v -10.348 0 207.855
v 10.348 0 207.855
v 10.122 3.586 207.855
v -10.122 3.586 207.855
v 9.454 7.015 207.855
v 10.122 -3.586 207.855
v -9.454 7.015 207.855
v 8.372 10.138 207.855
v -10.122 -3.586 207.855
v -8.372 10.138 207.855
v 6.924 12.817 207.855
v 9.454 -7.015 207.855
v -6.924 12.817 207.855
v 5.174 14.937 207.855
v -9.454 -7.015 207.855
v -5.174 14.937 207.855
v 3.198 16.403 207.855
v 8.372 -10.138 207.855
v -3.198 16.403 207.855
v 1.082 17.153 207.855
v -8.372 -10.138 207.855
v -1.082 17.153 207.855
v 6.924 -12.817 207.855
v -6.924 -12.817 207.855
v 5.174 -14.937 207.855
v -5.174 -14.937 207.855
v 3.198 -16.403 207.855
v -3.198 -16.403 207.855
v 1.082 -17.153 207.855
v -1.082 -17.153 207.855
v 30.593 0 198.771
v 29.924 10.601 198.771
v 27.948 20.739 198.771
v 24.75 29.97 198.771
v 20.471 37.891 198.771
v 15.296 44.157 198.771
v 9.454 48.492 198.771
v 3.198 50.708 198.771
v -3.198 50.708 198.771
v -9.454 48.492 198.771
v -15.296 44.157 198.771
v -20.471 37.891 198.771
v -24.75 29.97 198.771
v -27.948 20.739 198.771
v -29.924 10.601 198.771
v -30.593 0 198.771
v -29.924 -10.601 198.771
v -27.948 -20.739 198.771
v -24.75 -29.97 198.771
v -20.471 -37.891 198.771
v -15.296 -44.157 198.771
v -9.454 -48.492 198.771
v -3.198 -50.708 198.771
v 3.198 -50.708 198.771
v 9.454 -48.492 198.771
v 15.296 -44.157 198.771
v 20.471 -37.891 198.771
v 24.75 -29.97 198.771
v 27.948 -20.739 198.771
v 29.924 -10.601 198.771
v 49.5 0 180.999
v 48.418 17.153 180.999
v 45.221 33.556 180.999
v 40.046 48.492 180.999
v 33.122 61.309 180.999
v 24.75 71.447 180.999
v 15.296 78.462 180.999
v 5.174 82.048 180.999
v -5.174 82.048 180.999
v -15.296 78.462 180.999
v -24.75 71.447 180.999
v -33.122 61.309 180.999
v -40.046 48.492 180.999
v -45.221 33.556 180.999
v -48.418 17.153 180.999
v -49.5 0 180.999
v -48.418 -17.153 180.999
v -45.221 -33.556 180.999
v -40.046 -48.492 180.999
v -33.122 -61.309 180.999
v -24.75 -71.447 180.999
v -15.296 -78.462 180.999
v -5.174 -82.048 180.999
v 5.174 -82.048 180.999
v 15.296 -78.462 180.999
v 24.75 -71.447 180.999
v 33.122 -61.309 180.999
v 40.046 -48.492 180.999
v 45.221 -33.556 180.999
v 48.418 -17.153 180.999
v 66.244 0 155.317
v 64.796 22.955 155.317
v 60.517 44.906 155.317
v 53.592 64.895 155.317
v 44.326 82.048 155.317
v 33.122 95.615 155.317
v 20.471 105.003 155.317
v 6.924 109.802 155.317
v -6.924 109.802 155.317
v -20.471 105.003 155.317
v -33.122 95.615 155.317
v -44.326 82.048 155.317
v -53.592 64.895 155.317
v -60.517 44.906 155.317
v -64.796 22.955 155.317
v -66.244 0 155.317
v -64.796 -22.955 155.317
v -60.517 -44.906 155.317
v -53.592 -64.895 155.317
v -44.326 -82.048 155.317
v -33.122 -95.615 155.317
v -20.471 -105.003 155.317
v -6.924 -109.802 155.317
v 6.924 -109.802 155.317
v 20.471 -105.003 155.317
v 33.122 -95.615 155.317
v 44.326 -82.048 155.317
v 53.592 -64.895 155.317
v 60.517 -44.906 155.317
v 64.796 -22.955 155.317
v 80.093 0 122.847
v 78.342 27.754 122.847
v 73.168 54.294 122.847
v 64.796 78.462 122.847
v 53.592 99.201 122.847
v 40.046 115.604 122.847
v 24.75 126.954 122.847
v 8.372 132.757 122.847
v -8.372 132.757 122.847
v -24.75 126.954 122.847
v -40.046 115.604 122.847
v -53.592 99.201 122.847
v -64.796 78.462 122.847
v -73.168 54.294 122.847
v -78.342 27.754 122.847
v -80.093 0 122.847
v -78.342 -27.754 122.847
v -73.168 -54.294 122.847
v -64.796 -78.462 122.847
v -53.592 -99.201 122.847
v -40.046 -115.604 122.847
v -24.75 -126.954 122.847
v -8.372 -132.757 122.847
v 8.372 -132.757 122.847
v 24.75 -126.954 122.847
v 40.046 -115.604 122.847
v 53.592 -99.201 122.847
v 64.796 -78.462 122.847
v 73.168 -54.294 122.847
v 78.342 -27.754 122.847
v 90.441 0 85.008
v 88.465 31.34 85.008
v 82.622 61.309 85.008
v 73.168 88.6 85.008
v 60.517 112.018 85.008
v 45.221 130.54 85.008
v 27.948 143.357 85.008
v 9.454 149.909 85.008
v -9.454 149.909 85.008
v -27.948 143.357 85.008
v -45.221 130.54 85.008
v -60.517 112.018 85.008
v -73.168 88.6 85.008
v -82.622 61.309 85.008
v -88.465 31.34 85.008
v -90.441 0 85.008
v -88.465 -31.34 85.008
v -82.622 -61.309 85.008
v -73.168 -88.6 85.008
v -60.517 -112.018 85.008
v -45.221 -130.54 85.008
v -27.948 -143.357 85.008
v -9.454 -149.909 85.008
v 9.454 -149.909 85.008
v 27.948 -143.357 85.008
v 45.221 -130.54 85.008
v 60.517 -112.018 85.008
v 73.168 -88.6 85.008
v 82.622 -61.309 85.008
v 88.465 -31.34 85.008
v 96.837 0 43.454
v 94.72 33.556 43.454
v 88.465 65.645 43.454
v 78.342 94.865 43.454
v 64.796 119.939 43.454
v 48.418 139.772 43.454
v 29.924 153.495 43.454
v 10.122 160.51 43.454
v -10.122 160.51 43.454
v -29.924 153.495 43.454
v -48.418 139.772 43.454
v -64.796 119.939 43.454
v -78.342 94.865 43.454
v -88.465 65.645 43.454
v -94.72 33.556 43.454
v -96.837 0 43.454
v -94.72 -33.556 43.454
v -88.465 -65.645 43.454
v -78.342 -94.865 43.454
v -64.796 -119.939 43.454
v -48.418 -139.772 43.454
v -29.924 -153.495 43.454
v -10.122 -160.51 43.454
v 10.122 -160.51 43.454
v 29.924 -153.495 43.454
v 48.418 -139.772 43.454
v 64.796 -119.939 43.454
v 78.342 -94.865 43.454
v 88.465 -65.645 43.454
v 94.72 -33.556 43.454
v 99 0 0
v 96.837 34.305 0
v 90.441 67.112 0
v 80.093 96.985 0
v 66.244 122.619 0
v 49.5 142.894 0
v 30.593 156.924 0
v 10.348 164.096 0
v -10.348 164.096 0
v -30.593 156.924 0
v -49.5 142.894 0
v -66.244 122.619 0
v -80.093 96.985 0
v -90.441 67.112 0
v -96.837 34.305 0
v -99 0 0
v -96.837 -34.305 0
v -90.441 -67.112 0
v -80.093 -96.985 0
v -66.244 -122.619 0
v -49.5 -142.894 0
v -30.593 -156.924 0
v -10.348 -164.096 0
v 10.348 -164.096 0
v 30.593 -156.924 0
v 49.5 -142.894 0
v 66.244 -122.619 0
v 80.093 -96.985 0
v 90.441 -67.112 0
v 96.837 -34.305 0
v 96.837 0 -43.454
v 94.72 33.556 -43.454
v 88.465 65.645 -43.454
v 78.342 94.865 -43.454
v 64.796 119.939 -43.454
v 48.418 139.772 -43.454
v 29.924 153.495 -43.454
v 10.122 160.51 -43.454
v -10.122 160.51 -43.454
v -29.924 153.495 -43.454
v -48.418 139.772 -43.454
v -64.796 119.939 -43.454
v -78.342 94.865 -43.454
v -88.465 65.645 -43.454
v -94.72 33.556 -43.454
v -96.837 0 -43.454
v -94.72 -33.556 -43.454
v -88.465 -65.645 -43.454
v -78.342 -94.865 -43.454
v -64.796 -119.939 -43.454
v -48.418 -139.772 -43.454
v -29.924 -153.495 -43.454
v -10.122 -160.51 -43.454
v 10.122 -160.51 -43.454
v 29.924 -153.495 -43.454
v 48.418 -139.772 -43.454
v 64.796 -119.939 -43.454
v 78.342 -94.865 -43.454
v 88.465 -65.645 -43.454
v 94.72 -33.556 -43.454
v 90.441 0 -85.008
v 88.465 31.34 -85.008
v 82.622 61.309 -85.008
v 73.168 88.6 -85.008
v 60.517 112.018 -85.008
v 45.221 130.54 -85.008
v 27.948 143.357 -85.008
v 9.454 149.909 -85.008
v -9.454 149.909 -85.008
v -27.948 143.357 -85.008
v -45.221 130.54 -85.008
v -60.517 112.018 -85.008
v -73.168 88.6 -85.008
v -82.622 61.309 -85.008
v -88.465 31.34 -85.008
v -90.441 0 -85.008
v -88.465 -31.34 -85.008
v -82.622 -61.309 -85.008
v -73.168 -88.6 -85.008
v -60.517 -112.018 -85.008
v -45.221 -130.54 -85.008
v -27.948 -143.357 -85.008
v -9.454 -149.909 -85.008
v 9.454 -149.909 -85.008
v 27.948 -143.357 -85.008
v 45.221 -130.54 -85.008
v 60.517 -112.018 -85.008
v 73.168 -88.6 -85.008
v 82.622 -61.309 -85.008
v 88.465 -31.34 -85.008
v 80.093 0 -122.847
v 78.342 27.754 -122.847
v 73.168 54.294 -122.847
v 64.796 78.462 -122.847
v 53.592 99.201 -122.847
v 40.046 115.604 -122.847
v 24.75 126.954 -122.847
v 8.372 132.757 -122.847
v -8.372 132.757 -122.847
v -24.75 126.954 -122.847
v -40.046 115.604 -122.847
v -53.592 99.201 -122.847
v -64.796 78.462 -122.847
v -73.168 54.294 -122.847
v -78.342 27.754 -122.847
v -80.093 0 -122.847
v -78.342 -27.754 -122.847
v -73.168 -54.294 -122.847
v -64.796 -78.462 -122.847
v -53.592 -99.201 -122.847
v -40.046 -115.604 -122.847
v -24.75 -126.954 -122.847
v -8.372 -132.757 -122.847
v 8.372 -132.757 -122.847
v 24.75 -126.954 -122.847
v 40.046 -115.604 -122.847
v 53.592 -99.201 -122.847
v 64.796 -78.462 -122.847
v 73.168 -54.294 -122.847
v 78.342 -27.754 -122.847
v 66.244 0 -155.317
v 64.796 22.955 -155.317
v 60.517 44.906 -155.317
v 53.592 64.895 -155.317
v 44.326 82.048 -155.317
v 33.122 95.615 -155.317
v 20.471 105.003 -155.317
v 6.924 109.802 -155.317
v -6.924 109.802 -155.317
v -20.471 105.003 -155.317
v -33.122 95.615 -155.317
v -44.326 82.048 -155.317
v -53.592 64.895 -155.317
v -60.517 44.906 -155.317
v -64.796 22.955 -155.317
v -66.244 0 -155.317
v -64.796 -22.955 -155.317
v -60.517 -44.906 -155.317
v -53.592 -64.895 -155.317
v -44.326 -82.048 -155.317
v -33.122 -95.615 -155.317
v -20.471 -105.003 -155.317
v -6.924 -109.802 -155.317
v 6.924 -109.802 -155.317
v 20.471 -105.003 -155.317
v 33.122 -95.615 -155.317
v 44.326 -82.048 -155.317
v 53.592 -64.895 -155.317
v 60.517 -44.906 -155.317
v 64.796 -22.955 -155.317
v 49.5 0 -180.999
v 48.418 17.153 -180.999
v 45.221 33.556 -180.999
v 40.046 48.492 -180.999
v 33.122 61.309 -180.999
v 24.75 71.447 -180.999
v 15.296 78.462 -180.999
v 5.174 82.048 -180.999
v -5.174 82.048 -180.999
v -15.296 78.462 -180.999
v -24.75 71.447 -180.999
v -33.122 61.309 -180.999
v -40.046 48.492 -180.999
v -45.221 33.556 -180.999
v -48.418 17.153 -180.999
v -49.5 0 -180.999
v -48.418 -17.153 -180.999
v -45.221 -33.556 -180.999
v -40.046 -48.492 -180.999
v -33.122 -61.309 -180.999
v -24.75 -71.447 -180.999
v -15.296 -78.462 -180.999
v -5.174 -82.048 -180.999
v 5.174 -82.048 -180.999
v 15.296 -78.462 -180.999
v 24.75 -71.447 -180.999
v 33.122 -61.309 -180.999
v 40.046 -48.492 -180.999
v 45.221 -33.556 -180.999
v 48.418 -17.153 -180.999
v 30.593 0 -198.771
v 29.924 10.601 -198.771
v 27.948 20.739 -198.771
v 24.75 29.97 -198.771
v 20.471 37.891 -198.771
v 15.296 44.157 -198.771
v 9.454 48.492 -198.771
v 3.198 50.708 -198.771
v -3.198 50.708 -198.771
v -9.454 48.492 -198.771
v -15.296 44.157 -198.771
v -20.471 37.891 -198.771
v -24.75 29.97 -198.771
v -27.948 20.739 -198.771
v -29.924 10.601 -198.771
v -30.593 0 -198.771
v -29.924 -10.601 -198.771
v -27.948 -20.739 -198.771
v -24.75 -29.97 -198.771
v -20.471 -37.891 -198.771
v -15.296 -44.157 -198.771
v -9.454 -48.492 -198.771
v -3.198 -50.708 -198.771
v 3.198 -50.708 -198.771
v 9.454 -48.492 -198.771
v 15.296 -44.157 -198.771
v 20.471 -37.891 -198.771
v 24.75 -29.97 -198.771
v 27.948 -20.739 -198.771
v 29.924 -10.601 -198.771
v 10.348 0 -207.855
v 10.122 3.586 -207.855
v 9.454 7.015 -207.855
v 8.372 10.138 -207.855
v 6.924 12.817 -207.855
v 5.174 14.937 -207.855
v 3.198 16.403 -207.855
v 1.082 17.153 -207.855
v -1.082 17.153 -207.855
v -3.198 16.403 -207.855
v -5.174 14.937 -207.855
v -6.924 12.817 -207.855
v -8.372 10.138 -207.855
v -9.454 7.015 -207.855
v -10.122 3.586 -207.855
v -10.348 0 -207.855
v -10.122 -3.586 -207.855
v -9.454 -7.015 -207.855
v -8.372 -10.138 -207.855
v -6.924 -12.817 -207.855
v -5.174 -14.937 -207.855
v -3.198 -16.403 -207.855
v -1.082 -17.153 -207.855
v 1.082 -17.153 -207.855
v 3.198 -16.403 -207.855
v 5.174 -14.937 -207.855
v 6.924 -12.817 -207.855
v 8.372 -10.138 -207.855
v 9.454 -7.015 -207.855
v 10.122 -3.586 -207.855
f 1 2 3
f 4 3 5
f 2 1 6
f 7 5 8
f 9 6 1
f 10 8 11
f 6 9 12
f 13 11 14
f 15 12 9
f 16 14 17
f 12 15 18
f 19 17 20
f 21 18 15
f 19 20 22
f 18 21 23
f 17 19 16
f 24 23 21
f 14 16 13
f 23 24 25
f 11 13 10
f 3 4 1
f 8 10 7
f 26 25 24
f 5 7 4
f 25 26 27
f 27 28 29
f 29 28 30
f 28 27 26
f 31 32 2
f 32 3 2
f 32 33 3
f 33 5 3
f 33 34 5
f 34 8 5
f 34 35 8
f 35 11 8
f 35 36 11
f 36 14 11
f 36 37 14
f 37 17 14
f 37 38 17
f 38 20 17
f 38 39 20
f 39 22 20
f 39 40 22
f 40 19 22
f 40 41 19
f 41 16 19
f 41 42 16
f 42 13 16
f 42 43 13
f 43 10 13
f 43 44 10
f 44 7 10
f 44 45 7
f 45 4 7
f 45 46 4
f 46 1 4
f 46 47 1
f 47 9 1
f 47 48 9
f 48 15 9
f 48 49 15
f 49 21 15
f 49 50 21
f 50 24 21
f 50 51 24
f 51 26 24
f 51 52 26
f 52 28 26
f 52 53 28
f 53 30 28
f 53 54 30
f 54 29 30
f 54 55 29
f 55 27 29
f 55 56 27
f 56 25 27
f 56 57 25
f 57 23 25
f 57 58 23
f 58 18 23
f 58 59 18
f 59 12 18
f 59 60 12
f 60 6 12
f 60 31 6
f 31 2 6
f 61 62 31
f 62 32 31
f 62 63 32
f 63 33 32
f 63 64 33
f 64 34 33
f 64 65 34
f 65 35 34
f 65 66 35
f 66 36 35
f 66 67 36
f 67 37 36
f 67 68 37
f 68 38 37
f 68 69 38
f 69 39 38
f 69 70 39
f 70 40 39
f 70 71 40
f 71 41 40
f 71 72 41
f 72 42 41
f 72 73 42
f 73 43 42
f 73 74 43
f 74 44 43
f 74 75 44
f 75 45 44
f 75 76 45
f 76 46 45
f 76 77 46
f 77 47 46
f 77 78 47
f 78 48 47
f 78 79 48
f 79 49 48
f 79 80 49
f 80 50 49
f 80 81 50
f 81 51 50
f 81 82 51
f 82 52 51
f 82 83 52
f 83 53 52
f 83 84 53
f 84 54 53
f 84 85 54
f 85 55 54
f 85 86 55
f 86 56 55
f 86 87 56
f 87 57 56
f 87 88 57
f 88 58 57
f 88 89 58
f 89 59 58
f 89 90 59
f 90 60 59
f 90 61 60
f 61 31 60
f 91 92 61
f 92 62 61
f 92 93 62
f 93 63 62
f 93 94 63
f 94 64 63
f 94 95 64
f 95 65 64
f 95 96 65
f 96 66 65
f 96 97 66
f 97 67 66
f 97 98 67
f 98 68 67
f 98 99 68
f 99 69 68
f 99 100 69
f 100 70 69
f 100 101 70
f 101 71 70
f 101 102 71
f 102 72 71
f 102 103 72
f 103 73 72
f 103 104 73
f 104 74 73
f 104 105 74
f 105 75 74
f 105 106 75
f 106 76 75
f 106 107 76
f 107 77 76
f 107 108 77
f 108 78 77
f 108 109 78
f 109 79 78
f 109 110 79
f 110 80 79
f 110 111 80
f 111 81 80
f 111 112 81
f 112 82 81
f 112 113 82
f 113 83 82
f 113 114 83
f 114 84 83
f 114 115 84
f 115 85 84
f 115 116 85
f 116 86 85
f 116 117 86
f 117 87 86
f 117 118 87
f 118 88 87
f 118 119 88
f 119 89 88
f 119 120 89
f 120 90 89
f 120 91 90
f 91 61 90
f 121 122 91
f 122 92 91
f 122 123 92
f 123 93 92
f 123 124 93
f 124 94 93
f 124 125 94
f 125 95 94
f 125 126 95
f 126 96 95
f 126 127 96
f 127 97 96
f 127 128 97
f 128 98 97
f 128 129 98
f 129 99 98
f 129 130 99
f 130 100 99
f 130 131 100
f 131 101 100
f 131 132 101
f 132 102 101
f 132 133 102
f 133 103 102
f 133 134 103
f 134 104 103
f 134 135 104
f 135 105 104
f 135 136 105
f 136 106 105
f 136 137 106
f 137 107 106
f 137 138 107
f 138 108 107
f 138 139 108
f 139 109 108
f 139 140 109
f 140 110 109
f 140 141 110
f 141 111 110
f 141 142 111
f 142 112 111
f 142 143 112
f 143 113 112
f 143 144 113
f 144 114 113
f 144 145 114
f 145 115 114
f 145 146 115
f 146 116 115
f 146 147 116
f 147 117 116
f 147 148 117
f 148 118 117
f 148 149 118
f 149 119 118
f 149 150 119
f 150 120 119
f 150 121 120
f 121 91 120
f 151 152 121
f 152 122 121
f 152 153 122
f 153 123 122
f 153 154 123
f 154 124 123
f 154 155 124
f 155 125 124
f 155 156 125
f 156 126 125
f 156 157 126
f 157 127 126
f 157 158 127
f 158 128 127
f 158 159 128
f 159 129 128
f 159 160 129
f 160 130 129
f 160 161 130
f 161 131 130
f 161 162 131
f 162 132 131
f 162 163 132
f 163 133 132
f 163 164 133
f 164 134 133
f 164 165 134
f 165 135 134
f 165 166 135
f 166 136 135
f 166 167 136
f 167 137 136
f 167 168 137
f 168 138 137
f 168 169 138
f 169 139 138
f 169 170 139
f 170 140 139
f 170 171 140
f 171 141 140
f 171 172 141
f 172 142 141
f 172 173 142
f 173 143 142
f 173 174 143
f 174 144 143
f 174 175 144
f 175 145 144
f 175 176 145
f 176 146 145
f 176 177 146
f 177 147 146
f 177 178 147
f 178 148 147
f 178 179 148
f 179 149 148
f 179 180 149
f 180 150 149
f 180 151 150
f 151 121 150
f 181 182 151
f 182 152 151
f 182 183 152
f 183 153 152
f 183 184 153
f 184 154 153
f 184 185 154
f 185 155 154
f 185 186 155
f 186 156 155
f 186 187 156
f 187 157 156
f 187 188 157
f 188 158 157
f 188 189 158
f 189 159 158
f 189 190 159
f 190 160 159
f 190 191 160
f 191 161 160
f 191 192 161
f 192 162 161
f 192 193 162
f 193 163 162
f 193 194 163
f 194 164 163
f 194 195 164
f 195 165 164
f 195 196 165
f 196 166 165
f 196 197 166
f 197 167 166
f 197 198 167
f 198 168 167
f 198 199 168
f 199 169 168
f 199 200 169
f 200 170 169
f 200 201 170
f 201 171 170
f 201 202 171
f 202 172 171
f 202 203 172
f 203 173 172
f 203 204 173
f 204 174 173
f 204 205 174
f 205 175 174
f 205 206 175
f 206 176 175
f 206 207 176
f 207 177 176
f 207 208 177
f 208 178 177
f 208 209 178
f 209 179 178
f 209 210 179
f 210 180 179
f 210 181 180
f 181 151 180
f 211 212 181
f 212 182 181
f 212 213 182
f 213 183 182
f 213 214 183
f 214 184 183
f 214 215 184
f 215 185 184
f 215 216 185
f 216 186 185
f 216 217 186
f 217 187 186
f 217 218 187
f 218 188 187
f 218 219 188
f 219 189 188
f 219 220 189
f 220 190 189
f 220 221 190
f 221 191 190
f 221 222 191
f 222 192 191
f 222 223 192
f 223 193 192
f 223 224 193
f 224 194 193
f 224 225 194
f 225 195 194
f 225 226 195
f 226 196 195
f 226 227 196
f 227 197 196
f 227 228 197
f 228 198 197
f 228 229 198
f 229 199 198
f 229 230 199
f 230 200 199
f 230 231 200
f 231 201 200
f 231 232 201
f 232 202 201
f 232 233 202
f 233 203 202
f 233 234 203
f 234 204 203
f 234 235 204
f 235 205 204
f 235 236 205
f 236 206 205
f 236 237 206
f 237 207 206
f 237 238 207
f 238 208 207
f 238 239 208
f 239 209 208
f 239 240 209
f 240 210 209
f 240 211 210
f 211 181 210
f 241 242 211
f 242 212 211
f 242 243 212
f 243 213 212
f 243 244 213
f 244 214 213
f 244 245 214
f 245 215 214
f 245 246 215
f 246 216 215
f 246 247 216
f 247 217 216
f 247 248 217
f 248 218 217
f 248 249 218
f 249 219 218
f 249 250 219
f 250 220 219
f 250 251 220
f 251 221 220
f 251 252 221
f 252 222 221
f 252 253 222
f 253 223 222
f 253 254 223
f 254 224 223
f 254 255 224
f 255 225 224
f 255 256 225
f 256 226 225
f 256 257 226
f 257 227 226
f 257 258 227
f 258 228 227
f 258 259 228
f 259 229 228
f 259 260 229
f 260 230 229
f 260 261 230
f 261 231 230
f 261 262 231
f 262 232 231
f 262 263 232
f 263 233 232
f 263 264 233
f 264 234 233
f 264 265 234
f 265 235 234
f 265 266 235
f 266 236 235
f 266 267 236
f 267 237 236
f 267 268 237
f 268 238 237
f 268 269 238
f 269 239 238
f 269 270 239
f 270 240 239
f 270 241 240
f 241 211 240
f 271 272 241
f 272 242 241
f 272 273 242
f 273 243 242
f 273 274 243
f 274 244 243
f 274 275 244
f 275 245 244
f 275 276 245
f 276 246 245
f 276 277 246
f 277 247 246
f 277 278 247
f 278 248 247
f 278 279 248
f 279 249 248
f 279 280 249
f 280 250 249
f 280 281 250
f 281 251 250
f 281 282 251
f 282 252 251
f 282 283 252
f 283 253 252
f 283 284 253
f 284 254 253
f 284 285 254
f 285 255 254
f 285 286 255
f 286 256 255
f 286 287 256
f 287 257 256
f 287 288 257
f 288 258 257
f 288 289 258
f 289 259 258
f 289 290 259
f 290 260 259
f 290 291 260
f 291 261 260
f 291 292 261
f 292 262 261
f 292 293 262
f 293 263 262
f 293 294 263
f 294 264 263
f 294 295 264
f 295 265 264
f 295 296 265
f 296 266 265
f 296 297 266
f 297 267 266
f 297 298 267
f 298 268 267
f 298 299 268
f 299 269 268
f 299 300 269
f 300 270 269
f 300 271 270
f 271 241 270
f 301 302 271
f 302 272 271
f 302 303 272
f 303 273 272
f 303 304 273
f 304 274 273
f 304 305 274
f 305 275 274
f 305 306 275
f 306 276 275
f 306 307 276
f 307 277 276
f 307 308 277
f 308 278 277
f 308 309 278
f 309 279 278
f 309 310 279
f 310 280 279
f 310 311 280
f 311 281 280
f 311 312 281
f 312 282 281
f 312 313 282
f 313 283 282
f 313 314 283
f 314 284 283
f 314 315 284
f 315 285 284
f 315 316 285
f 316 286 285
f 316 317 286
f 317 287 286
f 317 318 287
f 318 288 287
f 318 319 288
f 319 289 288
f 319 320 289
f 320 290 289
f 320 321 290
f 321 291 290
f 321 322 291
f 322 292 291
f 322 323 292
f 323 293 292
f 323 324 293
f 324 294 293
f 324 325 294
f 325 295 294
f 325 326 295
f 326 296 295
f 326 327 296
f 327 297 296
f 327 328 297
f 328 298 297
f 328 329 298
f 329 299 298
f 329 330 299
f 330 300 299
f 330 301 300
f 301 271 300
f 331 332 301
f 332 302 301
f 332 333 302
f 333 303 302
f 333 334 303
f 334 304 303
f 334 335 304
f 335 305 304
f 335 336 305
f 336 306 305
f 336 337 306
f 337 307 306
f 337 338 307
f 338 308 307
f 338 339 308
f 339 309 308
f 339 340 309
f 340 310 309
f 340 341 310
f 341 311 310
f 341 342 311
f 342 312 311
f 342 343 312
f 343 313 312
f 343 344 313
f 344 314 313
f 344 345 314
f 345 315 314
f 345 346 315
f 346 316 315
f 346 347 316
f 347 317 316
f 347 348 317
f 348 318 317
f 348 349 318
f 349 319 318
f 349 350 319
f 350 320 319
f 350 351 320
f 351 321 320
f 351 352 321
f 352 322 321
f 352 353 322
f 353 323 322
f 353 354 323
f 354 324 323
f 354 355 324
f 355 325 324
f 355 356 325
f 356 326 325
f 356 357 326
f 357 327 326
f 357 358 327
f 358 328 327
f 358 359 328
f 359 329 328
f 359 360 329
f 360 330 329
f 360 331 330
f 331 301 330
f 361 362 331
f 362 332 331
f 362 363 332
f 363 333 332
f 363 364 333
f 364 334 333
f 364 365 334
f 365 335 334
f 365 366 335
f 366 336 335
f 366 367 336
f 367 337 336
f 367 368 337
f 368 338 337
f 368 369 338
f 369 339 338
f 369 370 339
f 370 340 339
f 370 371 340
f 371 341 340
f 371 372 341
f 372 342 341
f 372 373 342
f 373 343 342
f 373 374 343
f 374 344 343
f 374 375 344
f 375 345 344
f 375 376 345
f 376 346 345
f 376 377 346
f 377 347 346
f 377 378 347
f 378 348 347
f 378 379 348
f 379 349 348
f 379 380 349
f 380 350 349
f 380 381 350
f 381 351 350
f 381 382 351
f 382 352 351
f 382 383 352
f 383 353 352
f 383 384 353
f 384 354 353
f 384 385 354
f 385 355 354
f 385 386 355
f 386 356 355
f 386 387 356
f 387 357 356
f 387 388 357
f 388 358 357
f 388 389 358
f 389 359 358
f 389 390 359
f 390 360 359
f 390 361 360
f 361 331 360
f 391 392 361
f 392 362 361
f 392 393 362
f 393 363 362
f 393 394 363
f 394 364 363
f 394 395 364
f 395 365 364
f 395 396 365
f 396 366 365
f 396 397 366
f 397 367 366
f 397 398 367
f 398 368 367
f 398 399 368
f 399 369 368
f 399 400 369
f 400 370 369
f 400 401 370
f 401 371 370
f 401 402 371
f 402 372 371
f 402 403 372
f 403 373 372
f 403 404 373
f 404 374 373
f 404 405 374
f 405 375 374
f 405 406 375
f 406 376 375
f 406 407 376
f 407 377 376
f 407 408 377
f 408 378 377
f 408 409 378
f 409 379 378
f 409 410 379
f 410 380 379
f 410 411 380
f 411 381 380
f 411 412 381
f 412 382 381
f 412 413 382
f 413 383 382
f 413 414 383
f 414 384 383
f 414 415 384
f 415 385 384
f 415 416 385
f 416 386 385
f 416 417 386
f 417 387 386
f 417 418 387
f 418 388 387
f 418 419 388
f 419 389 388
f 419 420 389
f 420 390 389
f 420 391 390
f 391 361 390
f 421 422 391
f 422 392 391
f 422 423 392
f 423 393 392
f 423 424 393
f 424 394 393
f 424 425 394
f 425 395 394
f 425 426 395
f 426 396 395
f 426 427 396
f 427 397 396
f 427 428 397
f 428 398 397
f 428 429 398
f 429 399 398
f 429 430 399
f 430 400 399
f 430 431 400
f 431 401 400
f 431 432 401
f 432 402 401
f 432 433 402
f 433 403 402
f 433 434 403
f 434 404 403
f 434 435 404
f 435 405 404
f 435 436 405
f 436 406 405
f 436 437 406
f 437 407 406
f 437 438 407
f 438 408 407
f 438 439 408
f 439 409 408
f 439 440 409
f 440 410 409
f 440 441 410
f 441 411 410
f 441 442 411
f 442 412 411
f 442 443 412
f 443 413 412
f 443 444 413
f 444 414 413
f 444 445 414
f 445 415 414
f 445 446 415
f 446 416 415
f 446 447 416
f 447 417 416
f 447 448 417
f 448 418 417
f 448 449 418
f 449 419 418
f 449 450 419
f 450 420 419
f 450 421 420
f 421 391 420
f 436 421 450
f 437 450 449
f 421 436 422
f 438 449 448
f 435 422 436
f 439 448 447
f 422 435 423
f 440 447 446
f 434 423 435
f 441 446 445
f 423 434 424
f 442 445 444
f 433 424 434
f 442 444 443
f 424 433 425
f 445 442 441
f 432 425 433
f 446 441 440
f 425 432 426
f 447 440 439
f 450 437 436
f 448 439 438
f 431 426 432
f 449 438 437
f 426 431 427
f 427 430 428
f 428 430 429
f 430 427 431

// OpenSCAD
// Generated by SolidPython 1.0.1 on 2020-07-29 00:46:49


scale(v = [9, 15, 19]) {
	sphere(r = 11);
}
/***********************************************
*********      SolidPython code:      **********
************************************************
 
# import packages: SolidPython
from solid import *
from solid.utils import *
from itertools import chain, combinations, permutations


class Resize:

    def __init__(self, scad_file):
        self.scad_file = scad_file
        #self.scad_file = import_scad(scad_file)
        # cone/cylinder param:
        self.r1 = 0
        self.r2 = 0
        self.h = 0
        # rectangular prism param:
        self.w = 0
        self.l = 0
        # ellipse param:
        self.r = 0

    # import OpenScad code (file name corresponds to shape)


    # classify shape + parameters
    def assign(self, param1, param2, param3):
        if self.scad_file == 'cone.scad':
            self.r1 = param1
            self.r2 = param2
            self.h = param3
        elif self.scad_file == 'cylinder.scad':
            self.r1 = param1
            self.r2 = param2
            self.h = param3
        elif self.scad_file == 'rectangularPrism.scad':
            self.h = param1
            self.l = param2
            self.w = param3
        else:
            self.r = param1
            self.h = param2

    # resize parameters
    def iterate(self):
        x = range(3, 20, 2)
        i = 1
        if self.scad_file == 'cone.scad':
            tempList = list(permutations(x, 2))
            for temp in tempList:
                param1 = temp[0]
                param2 = temp[1]
                filepath = 'produced_scad_files/' + 'cone' + str(param1) + '_' + str(param2) + '_' + '.scad'
                scad_render_to_file(cylinder(h=param1, r1=param2, r2=0), filepath)

        elif self.scad_file == 'cylinder.scad':
            tempList = list(permutations(x, 3))
            for temp in tempList:
                param1 = temp[0]
                param2 = temp[1]
                filepath = 'produced_scad_files/' + 'cylinder' + str(param1) + '_' + str(param2) + '_' + '.scad'
                scad_render_to_file(cylinder(h=param1, r1=param2, r2=param2), filepath)

        elif self.scad_file == 'rectangularPrism.scad':
            tempList = list(permutations(x, 3))
            for temp in tempList:
                param1 = temp[0]
                param2 = temp[1]
                param3 = temp[2]
                filepath = 'produced_scad_files/' + 'rectangularPrism' + str(param1) + '_' + str(param2) + '_' + str(
                    param3) + '.scad'
                scad_render_to_file(cube(size=(param1, param2, param3)), filepath)

        elif self.scad_file == 'ellipse.scad':
            tempList = list(permutations(x, 4))
            for temp in tempList:
                param1 = temp[0]
                param2 = temp[1]
                param3 = temp[2]
                param4 = temp[3]
                filepath = 'produced_scad_files/' + 'ellipse' + str(param1) + '_' + str(param2) + '_' + str(param3) + '_' + str(param4) + '.scad'
                scad_render_to_file(scale([param1, param2, param3])(sphere(r=param4)), filepath)

    def render_to_scadfile(self):
        scad_render_to_file(scad, 'example.scad') 
 
************************************************/
